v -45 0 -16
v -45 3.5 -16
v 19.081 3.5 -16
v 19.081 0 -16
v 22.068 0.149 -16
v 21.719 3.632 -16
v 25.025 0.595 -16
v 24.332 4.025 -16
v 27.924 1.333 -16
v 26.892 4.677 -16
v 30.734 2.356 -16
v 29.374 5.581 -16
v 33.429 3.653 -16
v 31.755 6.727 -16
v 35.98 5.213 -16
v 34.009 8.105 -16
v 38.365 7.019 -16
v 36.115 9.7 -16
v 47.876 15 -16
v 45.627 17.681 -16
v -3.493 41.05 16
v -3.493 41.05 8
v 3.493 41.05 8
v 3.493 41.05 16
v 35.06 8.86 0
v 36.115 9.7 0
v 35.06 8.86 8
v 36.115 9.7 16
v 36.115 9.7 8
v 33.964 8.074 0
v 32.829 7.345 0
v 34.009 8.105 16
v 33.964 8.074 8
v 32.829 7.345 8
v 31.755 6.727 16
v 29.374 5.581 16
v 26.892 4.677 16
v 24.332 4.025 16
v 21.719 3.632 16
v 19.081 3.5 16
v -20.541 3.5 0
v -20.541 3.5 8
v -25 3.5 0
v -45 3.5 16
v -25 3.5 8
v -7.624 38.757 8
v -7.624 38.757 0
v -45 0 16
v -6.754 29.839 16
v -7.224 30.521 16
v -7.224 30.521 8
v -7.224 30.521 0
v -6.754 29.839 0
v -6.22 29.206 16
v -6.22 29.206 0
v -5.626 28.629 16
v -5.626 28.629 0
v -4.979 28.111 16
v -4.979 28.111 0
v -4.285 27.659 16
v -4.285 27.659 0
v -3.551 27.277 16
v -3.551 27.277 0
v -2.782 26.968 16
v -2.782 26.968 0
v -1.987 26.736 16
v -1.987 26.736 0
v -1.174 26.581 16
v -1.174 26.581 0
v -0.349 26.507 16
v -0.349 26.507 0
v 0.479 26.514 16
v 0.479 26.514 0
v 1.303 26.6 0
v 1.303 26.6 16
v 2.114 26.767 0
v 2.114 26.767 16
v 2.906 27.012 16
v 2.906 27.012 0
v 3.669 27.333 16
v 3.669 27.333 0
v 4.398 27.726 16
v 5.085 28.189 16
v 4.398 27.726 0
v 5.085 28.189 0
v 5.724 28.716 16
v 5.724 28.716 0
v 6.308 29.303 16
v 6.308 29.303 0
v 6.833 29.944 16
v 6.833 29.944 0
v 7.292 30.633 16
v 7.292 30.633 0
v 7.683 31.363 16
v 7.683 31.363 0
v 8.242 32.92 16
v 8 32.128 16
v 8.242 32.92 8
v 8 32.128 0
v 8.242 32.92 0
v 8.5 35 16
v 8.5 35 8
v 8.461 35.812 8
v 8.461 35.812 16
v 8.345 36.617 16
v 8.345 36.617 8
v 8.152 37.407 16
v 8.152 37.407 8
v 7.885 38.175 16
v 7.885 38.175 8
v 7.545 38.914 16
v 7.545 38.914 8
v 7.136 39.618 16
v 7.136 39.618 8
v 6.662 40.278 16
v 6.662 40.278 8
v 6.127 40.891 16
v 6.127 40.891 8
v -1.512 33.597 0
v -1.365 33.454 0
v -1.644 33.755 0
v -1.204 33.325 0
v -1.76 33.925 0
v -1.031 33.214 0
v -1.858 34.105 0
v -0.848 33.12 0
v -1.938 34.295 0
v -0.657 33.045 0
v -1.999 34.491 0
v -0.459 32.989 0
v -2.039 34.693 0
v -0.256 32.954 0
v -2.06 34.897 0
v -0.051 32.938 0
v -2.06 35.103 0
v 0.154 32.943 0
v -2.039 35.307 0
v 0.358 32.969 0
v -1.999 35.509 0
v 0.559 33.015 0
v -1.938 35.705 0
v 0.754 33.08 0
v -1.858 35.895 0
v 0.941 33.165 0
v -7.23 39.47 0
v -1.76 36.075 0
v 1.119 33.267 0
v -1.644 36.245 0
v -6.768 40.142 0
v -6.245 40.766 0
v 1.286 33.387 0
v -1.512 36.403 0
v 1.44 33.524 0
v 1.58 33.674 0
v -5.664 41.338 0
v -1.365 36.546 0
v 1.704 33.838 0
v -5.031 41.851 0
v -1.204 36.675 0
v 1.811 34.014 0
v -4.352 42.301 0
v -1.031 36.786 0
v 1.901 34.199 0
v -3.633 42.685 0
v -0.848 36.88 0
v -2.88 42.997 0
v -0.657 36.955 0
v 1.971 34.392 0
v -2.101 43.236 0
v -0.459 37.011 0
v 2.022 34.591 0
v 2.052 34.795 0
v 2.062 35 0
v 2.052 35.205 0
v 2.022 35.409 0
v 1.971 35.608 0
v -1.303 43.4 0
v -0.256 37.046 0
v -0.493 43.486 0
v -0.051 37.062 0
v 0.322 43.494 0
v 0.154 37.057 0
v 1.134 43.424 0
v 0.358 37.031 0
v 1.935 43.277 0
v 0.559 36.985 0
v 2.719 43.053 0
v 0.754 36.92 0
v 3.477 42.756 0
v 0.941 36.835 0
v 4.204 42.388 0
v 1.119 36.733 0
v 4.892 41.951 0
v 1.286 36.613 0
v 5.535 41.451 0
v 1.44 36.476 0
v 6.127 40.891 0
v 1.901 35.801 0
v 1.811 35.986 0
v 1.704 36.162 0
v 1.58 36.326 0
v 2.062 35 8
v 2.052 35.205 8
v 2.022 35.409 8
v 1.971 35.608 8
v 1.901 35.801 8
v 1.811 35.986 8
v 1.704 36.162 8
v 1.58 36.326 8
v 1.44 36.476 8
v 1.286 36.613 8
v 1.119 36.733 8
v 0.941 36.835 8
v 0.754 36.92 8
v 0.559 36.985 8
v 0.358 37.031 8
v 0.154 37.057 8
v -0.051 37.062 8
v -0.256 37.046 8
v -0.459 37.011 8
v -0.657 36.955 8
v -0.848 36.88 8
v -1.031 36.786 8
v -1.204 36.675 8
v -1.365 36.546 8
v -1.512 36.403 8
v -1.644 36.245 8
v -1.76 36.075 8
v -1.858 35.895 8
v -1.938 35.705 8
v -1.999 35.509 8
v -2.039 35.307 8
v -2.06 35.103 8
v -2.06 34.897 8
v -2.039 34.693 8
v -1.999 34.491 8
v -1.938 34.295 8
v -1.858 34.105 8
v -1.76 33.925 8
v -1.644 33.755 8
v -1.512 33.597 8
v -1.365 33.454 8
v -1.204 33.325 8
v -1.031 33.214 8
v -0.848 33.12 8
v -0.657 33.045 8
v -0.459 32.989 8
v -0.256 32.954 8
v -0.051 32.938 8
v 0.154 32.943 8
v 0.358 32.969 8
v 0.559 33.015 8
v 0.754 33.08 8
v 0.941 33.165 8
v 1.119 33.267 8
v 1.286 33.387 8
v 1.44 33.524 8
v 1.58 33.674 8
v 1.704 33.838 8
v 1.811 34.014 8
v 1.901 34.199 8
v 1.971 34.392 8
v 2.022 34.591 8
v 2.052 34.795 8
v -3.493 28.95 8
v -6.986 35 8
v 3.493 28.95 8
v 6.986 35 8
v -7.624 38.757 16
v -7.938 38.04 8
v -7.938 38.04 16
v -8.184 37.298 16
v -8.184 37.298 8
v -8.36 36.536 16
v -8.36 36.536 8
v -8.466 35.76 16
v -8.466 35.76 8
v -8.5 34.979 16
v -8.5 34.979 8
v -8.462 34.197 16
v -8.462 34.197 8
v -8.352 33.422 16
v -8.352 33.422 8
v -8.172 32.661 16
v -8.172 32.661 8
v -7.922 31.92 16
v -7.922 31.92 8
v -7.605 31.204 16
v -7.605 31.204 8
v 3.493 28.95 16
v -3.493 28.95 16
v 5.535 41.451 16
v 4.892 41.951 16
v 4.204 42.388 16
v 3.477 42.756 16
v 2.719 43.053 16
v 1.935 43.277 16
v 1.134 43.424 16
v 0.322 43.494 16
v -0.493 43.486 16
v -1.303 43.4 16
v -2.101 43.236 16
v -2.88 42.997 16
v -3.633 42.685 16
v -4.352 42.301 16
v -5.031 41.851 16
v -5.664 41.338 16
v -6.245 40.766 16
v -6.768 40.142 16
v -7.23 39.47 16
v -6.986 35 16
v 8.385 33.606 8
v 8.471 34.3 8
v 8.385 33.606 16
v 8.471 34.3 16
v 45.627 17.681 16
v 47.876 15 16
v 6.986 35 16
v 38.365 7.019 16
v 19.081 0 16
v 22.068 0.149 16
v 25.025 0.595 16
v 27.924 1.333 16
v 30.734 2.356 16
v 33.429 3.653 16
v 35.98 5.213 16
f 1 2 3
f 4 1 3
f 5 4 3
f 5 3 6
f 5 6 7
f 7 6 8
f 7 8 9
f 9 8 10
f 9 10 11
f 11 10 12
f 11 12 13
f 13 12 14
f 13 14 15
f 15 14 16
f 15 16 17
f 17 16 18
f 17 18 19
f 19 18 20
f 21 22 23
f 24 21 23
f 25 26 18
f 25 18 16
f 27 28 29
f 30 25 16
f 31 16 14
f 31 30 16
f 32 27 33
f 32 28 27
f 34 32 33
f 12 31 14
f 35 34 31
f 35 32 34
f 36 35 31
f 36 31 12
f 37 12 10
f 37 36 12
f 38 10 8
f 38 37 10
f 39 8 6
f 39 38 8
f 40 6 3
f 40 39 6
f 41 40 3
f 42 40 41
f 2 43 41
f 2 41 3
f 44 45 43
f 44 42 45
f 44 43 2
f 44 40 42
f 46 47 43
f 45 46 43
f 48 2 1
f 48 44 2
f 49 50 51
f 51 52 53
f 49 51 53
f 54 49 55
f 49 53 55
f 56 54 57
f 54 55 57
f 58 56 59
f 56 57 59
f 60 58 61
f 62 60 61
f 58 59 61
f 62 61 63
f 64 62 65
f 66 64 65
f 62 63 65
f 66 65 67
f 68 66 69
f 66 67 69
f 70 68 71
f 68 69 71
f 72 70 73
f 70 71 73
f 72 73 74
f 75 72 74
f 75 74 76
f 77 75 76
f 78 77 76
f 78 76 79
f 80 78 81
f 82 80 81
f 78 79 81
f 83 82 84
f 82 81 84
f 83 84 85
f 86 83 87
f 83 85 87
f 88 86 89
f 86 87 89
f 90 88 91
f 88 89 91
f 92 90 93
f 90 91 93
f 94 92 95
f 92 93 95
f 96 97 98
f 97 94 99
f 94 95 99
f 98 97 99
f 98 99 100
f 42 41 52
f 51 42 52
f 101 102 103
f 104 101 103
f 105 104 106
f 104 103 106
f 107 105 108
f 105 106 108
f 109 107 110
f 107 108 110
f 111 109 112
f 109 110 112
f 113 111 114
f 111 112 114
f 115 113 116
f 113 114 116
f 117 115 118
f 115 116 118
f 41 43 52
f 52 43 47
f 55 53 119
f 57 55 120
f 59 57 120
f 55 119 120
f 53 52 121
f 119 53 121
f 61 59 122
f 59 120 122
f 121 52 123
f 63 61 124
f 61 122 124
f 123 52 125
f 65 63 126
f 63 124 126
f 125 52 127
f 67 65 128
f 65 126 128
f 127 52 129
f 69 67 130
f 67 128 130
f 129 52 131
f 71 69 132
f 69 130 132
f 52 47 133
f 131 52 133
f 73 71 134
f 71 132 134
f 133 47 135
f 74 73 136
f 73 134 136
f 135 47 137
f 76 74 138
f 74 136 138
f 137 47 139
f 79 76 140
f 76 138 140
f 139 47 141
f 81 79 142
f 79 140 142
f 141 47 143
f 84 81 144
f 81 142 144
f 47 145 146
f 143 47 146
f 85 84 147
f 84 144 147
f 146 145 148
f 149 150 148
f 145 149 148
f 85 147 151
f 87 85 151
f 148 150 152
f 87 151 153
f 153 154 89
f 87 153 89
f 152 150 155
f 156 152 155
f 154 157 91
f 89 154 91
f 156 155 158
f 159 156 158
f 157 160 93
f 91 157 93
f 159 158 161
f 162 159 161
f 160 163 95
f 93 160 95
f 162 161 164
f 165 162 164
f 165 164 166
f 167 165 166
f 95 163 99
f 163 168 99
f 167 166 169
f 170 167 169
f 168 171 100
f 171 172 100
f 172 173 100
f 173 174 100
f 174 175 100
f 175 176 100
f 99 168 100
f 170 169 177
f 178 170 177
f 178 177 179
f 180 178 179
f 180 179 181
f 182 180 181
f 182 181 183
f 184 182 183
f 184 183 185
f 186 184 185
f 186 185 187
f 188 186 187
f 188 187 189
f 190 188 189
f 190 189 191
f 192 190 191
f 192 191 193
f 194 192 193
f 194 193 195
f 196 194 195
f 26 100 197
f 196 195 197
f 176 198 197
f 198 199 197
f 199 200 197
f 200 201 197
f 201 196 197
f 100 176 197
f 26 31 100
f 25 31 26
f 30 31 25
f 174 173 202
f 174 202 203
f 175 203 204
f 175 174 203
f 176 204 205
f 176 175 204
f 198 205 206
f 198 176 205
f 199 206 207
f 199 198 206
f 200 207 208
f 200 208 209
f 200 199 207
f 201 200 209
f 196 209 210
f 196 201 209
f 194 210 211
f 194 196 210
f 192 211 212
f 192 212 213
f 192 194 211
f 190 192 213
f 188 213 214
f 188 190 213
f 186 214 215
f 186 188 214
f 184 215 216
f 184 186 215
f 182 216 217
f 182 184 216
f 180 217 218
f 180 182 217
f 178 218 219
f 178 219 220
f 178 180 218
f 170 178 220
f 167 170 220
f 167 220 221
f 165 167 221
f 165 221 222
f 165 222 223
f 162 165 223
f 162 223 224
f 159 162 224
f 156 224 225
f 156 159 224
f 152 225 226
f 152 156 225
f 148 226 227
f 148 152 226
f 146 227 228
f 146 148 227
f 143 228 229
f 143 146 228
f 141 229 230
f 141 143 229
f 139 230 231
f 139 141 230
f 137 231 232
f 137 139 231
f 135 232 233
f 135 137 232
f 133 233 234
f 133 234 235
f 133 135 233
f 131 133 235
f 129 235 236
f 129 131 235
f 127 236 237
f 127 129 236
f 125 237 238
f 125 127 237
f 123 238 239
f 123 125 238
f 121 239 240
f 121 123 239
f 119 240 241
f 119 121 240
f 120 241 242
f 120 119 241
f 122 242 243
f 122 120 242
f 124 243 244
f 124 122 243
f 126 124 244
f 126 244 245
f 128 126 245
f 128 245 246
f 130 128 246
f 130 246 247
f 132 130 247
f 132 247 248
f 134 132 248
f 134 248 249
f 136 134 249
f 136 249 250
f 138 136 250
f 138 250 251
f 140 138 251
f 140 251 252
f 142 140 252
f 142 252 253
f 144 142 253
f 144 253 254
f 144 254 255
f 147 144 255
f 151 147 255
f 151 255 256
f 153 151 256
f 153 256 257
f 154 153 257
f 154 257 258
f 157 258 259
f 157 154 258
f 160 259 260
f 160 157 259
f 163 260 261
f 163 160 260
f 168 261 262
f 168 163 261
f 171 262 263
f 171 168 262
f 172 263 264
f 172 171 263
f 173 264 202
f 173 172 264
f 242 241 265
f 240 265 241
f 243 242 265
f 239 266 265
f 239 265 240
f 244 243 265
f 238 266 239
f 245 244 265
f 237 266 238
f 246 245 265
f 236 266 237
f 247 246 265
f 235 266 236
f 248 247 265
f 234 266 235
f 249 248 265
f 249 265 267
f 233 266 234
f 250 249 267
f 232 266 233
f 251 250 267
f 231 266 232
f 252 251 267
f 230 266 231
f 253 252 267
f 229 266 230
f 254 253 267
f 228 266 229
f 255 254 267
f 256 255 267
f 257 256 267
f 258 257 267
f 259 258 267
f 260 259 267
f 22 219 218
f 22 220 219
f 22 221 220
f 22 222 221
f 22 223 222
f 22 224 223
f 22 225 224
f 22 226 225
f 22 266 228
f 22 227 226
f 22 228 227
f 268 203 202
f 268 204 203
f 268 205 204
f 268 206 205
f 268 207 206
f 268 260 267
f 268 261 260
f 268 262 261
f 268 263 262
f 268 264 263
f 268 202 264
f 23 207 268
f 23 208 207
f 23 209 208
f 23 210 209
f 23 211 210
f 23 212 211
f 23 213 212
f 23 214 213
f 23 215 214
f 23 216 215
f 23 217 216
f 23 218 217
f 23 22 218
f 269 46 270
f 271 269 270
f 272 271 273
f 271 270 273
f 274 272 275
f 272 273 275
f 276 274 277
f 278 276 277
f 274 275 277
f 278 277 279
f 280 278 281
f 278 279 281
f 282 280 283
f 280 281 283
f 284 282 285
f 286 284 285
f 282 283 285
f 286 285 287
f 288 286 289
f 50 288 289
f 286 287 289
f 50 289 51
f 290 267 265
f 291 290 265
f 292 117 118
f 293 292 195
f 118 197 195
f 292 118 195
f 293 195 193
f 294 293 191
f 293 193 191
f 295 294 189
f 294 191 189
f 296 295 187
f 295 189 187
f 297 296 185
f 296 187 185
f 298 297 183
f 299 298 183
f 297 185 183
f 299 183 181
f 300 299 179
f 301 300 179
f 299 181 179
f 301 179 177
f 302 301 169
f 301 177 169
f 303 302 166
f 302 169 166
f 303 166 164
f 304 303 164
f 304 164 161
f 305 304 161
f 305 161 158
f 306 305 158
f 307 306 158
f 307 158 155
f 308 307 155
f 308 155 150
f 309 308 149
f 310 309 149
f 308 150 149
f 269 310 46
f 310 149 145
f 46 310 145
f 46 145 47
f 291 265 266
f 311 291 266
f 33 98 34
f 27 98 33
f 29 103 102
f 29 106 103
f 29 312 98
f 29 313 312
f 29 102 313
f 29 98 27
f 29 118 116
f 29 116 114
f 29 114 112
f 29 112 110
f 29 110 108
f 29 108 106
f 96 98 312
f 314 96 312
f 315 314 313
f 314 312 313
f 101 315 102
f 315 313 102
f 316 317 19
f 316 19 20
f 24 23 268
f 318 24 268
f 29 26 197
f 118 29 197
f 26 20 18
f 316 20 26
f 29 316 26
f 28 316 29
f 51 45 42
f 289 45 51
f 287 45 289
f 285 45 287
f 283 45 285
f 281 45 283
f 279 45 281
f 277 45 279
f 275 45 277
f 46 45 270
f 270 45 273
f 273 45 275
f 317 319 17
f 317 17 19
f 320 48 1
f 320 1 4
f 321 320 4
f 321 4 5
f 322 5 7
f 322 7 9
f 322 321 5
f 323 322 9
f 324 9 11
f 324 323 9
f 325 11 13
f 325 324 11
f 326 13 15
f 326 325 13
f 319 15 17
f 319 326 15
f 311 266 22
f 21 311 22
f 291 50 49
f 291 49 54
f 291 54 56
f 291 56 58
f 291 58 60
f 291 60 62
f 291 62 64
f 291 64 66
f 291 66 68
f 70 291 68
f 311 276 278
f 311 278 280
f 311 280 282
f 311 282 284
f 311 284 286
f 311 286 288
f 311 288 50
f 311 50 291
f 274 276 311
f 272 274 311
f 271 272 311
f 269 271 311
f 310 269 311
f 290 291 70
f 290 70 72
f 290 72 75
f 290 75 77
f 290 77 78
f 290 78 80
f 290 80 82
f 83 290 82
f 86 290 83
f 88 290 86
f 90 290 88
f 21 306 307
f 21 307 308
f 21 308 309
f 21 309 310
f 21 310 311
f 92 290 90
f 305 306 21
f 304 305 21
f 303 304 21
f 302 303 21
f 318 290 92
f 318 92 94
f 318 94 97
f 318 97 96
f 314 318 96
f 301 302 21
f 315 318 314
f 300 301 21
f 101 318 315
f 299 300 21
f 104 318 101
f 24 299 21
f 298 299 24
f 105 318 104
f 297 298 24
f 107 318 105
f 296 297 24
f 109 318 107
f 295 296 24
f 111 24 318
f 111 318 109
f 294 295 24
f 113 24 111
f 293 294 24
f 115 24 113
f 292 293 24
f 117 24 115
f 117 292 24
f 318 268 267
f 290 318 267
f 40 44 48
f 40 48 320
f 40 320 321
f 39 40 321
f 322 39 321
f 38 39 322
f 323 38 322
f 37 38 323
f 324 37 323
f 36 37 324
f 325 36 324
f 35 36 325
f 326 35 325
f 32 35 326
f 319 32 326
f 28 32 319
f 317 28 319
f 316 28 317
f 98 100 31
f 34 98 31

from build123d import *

# Parameters (mm, degrees)
F1_DEPTH = 16
F2_R     = 2.0625
F3_DEPTH = 8
F5_DEPTH = 8


with BuildPart() as f1:
    # F0 (on Top) → F1 (new body, symmetric)
    with BuildSketch(Plane.XY):
        with BuildLine():
            Line((-45, 3.500000108), (-45, 0))
            Line((-45, 0), (19.080892972, 0))
            ThreePointArc((19.080892972, 0), (29.3414972718, 1.8092213764), (38.3645212626, 7.0186667064))
            Line((38.3645212626, 7.0186667064), (47.8763038889, 15))
            Line((47.8763038889, 15), (45.6265471856, 17.6811556337))
            Line((45.6265471856, 17.6811556337), (36.1147645593, 9.6998223401))
            ThreePointArc((36.1147645593, 9.6998223401), (28.1444267332, 5.0981456507), (19.080892972, 3.500000108))
            Line((19.080892972, 3.500000108), (-45, 3.500000108))
        make_face()
    extrude(amount=F1_DEPTH, both=True)

    # F2 (on Top) → F3 (join)
    with BuildSketch(Plane.XY):
        with BuildLine():
            Line((-7.6244007781, 38.7574609479), (-25, 3.500000108))
            Line((-25, 3.500000108), (-20.5406331606, 3.500000108))
            Line((-20.5406331606, 3.500000108), (-7.2241458503, 30.5209692194))
            ThreePointArc((-7.2241458503, 30.5209692194), (-8.4899813452, 34.5874266639), (-7.6244007781, 38.7574609479))
        make_face()
        with BuildLine():
            ThreePointArc((6.1274973095, 40.8909911493), (-1.3031376668, 43.3995138086), (-7.6244007781, 38.7574609479))
            ThreePointArc((-7.6244007781, 38.7574609479), (-8.4899813452, 34.5874266639), (-7.2241458503, 30.5209692194))
            ThreePointArc((-7.2241458503, 30.5209692194), (1.3031376668, 26.6004861914), (8.2416799056, 32.9204057285))
            ThreePointArc((8.2416799056, 32.9204057285), (8.4351727664, 33.952211662), (8.5, 35))
            ThreePointArc((8.5, 35), (7.8845966013, 38.1753954769), (6.1274973095, 40.8909911493))
        make_face()
        with Locations((0, 35)):
            Circle(F2_R, mode=Mode.SUBTRACT)
        with BuildLine():
            Line((36.1147645593, 9.6998223401), (6.1274973095, 40.8909911493))
            ThreePointArc((6.1274973095, 40.8909911493), (7.8845966013, 38.1753954769), (8.5, 35))
            ThreePointArc((8.5, 35), (8.4351727664, 33.952211662), (8.2416799056, 32.9204057285))
            Line((8.2416799056, 32.9204057285), (32.8294657363, 7.3454918124))
            ThreePointArc((32.8294657363, 7.3454918124), (34.517066012, 8.45993138), (36.1147645593, 9.6998223401))
        make_face()
    extrude(amount=F3_DEPTH)

    # F4 (on face) → F5 (join)
    with BuildSketch(Plane.XY.offset(8)):
        with BuildLine():
            ThreePointArc((8.2416799056, 32.9204057285), (8.4351727664, 33.952211662), (8.5, 35))
            ThreePointArc((8.5, 35), (7.8845966013, 38.1753954769), (6.1274973095, 40.8909911493))
            ThreePointArc((6.1274973095, 40.8909911493), (-1.3031376668, 43.3995138086), (-7.6244007781, 38.7574609479))
            ThreePointArc((-7.6244007781, 38.7574609479), (-8.4899813452, 34.5874266639), (-7.2241458503, 30.5209692194))
            ThreePointArc((-7.2241458503, 30.5209692194), (1.3031376668, 26.6004861914), (8.2416799056, 32.9204057285))
        make_face()
        Polygon((-6.9859382572, 35), (-3.4929691286, 41.05), (3.4929691286, 41.05), (6.9859382572, 35), (3.4929691286, 28.95), (-3.4929691286, 28.95), align=None, mode=Mode.SUBTRACT)
    extrude(amount=F5_DEPTH)


solid = f1.part
